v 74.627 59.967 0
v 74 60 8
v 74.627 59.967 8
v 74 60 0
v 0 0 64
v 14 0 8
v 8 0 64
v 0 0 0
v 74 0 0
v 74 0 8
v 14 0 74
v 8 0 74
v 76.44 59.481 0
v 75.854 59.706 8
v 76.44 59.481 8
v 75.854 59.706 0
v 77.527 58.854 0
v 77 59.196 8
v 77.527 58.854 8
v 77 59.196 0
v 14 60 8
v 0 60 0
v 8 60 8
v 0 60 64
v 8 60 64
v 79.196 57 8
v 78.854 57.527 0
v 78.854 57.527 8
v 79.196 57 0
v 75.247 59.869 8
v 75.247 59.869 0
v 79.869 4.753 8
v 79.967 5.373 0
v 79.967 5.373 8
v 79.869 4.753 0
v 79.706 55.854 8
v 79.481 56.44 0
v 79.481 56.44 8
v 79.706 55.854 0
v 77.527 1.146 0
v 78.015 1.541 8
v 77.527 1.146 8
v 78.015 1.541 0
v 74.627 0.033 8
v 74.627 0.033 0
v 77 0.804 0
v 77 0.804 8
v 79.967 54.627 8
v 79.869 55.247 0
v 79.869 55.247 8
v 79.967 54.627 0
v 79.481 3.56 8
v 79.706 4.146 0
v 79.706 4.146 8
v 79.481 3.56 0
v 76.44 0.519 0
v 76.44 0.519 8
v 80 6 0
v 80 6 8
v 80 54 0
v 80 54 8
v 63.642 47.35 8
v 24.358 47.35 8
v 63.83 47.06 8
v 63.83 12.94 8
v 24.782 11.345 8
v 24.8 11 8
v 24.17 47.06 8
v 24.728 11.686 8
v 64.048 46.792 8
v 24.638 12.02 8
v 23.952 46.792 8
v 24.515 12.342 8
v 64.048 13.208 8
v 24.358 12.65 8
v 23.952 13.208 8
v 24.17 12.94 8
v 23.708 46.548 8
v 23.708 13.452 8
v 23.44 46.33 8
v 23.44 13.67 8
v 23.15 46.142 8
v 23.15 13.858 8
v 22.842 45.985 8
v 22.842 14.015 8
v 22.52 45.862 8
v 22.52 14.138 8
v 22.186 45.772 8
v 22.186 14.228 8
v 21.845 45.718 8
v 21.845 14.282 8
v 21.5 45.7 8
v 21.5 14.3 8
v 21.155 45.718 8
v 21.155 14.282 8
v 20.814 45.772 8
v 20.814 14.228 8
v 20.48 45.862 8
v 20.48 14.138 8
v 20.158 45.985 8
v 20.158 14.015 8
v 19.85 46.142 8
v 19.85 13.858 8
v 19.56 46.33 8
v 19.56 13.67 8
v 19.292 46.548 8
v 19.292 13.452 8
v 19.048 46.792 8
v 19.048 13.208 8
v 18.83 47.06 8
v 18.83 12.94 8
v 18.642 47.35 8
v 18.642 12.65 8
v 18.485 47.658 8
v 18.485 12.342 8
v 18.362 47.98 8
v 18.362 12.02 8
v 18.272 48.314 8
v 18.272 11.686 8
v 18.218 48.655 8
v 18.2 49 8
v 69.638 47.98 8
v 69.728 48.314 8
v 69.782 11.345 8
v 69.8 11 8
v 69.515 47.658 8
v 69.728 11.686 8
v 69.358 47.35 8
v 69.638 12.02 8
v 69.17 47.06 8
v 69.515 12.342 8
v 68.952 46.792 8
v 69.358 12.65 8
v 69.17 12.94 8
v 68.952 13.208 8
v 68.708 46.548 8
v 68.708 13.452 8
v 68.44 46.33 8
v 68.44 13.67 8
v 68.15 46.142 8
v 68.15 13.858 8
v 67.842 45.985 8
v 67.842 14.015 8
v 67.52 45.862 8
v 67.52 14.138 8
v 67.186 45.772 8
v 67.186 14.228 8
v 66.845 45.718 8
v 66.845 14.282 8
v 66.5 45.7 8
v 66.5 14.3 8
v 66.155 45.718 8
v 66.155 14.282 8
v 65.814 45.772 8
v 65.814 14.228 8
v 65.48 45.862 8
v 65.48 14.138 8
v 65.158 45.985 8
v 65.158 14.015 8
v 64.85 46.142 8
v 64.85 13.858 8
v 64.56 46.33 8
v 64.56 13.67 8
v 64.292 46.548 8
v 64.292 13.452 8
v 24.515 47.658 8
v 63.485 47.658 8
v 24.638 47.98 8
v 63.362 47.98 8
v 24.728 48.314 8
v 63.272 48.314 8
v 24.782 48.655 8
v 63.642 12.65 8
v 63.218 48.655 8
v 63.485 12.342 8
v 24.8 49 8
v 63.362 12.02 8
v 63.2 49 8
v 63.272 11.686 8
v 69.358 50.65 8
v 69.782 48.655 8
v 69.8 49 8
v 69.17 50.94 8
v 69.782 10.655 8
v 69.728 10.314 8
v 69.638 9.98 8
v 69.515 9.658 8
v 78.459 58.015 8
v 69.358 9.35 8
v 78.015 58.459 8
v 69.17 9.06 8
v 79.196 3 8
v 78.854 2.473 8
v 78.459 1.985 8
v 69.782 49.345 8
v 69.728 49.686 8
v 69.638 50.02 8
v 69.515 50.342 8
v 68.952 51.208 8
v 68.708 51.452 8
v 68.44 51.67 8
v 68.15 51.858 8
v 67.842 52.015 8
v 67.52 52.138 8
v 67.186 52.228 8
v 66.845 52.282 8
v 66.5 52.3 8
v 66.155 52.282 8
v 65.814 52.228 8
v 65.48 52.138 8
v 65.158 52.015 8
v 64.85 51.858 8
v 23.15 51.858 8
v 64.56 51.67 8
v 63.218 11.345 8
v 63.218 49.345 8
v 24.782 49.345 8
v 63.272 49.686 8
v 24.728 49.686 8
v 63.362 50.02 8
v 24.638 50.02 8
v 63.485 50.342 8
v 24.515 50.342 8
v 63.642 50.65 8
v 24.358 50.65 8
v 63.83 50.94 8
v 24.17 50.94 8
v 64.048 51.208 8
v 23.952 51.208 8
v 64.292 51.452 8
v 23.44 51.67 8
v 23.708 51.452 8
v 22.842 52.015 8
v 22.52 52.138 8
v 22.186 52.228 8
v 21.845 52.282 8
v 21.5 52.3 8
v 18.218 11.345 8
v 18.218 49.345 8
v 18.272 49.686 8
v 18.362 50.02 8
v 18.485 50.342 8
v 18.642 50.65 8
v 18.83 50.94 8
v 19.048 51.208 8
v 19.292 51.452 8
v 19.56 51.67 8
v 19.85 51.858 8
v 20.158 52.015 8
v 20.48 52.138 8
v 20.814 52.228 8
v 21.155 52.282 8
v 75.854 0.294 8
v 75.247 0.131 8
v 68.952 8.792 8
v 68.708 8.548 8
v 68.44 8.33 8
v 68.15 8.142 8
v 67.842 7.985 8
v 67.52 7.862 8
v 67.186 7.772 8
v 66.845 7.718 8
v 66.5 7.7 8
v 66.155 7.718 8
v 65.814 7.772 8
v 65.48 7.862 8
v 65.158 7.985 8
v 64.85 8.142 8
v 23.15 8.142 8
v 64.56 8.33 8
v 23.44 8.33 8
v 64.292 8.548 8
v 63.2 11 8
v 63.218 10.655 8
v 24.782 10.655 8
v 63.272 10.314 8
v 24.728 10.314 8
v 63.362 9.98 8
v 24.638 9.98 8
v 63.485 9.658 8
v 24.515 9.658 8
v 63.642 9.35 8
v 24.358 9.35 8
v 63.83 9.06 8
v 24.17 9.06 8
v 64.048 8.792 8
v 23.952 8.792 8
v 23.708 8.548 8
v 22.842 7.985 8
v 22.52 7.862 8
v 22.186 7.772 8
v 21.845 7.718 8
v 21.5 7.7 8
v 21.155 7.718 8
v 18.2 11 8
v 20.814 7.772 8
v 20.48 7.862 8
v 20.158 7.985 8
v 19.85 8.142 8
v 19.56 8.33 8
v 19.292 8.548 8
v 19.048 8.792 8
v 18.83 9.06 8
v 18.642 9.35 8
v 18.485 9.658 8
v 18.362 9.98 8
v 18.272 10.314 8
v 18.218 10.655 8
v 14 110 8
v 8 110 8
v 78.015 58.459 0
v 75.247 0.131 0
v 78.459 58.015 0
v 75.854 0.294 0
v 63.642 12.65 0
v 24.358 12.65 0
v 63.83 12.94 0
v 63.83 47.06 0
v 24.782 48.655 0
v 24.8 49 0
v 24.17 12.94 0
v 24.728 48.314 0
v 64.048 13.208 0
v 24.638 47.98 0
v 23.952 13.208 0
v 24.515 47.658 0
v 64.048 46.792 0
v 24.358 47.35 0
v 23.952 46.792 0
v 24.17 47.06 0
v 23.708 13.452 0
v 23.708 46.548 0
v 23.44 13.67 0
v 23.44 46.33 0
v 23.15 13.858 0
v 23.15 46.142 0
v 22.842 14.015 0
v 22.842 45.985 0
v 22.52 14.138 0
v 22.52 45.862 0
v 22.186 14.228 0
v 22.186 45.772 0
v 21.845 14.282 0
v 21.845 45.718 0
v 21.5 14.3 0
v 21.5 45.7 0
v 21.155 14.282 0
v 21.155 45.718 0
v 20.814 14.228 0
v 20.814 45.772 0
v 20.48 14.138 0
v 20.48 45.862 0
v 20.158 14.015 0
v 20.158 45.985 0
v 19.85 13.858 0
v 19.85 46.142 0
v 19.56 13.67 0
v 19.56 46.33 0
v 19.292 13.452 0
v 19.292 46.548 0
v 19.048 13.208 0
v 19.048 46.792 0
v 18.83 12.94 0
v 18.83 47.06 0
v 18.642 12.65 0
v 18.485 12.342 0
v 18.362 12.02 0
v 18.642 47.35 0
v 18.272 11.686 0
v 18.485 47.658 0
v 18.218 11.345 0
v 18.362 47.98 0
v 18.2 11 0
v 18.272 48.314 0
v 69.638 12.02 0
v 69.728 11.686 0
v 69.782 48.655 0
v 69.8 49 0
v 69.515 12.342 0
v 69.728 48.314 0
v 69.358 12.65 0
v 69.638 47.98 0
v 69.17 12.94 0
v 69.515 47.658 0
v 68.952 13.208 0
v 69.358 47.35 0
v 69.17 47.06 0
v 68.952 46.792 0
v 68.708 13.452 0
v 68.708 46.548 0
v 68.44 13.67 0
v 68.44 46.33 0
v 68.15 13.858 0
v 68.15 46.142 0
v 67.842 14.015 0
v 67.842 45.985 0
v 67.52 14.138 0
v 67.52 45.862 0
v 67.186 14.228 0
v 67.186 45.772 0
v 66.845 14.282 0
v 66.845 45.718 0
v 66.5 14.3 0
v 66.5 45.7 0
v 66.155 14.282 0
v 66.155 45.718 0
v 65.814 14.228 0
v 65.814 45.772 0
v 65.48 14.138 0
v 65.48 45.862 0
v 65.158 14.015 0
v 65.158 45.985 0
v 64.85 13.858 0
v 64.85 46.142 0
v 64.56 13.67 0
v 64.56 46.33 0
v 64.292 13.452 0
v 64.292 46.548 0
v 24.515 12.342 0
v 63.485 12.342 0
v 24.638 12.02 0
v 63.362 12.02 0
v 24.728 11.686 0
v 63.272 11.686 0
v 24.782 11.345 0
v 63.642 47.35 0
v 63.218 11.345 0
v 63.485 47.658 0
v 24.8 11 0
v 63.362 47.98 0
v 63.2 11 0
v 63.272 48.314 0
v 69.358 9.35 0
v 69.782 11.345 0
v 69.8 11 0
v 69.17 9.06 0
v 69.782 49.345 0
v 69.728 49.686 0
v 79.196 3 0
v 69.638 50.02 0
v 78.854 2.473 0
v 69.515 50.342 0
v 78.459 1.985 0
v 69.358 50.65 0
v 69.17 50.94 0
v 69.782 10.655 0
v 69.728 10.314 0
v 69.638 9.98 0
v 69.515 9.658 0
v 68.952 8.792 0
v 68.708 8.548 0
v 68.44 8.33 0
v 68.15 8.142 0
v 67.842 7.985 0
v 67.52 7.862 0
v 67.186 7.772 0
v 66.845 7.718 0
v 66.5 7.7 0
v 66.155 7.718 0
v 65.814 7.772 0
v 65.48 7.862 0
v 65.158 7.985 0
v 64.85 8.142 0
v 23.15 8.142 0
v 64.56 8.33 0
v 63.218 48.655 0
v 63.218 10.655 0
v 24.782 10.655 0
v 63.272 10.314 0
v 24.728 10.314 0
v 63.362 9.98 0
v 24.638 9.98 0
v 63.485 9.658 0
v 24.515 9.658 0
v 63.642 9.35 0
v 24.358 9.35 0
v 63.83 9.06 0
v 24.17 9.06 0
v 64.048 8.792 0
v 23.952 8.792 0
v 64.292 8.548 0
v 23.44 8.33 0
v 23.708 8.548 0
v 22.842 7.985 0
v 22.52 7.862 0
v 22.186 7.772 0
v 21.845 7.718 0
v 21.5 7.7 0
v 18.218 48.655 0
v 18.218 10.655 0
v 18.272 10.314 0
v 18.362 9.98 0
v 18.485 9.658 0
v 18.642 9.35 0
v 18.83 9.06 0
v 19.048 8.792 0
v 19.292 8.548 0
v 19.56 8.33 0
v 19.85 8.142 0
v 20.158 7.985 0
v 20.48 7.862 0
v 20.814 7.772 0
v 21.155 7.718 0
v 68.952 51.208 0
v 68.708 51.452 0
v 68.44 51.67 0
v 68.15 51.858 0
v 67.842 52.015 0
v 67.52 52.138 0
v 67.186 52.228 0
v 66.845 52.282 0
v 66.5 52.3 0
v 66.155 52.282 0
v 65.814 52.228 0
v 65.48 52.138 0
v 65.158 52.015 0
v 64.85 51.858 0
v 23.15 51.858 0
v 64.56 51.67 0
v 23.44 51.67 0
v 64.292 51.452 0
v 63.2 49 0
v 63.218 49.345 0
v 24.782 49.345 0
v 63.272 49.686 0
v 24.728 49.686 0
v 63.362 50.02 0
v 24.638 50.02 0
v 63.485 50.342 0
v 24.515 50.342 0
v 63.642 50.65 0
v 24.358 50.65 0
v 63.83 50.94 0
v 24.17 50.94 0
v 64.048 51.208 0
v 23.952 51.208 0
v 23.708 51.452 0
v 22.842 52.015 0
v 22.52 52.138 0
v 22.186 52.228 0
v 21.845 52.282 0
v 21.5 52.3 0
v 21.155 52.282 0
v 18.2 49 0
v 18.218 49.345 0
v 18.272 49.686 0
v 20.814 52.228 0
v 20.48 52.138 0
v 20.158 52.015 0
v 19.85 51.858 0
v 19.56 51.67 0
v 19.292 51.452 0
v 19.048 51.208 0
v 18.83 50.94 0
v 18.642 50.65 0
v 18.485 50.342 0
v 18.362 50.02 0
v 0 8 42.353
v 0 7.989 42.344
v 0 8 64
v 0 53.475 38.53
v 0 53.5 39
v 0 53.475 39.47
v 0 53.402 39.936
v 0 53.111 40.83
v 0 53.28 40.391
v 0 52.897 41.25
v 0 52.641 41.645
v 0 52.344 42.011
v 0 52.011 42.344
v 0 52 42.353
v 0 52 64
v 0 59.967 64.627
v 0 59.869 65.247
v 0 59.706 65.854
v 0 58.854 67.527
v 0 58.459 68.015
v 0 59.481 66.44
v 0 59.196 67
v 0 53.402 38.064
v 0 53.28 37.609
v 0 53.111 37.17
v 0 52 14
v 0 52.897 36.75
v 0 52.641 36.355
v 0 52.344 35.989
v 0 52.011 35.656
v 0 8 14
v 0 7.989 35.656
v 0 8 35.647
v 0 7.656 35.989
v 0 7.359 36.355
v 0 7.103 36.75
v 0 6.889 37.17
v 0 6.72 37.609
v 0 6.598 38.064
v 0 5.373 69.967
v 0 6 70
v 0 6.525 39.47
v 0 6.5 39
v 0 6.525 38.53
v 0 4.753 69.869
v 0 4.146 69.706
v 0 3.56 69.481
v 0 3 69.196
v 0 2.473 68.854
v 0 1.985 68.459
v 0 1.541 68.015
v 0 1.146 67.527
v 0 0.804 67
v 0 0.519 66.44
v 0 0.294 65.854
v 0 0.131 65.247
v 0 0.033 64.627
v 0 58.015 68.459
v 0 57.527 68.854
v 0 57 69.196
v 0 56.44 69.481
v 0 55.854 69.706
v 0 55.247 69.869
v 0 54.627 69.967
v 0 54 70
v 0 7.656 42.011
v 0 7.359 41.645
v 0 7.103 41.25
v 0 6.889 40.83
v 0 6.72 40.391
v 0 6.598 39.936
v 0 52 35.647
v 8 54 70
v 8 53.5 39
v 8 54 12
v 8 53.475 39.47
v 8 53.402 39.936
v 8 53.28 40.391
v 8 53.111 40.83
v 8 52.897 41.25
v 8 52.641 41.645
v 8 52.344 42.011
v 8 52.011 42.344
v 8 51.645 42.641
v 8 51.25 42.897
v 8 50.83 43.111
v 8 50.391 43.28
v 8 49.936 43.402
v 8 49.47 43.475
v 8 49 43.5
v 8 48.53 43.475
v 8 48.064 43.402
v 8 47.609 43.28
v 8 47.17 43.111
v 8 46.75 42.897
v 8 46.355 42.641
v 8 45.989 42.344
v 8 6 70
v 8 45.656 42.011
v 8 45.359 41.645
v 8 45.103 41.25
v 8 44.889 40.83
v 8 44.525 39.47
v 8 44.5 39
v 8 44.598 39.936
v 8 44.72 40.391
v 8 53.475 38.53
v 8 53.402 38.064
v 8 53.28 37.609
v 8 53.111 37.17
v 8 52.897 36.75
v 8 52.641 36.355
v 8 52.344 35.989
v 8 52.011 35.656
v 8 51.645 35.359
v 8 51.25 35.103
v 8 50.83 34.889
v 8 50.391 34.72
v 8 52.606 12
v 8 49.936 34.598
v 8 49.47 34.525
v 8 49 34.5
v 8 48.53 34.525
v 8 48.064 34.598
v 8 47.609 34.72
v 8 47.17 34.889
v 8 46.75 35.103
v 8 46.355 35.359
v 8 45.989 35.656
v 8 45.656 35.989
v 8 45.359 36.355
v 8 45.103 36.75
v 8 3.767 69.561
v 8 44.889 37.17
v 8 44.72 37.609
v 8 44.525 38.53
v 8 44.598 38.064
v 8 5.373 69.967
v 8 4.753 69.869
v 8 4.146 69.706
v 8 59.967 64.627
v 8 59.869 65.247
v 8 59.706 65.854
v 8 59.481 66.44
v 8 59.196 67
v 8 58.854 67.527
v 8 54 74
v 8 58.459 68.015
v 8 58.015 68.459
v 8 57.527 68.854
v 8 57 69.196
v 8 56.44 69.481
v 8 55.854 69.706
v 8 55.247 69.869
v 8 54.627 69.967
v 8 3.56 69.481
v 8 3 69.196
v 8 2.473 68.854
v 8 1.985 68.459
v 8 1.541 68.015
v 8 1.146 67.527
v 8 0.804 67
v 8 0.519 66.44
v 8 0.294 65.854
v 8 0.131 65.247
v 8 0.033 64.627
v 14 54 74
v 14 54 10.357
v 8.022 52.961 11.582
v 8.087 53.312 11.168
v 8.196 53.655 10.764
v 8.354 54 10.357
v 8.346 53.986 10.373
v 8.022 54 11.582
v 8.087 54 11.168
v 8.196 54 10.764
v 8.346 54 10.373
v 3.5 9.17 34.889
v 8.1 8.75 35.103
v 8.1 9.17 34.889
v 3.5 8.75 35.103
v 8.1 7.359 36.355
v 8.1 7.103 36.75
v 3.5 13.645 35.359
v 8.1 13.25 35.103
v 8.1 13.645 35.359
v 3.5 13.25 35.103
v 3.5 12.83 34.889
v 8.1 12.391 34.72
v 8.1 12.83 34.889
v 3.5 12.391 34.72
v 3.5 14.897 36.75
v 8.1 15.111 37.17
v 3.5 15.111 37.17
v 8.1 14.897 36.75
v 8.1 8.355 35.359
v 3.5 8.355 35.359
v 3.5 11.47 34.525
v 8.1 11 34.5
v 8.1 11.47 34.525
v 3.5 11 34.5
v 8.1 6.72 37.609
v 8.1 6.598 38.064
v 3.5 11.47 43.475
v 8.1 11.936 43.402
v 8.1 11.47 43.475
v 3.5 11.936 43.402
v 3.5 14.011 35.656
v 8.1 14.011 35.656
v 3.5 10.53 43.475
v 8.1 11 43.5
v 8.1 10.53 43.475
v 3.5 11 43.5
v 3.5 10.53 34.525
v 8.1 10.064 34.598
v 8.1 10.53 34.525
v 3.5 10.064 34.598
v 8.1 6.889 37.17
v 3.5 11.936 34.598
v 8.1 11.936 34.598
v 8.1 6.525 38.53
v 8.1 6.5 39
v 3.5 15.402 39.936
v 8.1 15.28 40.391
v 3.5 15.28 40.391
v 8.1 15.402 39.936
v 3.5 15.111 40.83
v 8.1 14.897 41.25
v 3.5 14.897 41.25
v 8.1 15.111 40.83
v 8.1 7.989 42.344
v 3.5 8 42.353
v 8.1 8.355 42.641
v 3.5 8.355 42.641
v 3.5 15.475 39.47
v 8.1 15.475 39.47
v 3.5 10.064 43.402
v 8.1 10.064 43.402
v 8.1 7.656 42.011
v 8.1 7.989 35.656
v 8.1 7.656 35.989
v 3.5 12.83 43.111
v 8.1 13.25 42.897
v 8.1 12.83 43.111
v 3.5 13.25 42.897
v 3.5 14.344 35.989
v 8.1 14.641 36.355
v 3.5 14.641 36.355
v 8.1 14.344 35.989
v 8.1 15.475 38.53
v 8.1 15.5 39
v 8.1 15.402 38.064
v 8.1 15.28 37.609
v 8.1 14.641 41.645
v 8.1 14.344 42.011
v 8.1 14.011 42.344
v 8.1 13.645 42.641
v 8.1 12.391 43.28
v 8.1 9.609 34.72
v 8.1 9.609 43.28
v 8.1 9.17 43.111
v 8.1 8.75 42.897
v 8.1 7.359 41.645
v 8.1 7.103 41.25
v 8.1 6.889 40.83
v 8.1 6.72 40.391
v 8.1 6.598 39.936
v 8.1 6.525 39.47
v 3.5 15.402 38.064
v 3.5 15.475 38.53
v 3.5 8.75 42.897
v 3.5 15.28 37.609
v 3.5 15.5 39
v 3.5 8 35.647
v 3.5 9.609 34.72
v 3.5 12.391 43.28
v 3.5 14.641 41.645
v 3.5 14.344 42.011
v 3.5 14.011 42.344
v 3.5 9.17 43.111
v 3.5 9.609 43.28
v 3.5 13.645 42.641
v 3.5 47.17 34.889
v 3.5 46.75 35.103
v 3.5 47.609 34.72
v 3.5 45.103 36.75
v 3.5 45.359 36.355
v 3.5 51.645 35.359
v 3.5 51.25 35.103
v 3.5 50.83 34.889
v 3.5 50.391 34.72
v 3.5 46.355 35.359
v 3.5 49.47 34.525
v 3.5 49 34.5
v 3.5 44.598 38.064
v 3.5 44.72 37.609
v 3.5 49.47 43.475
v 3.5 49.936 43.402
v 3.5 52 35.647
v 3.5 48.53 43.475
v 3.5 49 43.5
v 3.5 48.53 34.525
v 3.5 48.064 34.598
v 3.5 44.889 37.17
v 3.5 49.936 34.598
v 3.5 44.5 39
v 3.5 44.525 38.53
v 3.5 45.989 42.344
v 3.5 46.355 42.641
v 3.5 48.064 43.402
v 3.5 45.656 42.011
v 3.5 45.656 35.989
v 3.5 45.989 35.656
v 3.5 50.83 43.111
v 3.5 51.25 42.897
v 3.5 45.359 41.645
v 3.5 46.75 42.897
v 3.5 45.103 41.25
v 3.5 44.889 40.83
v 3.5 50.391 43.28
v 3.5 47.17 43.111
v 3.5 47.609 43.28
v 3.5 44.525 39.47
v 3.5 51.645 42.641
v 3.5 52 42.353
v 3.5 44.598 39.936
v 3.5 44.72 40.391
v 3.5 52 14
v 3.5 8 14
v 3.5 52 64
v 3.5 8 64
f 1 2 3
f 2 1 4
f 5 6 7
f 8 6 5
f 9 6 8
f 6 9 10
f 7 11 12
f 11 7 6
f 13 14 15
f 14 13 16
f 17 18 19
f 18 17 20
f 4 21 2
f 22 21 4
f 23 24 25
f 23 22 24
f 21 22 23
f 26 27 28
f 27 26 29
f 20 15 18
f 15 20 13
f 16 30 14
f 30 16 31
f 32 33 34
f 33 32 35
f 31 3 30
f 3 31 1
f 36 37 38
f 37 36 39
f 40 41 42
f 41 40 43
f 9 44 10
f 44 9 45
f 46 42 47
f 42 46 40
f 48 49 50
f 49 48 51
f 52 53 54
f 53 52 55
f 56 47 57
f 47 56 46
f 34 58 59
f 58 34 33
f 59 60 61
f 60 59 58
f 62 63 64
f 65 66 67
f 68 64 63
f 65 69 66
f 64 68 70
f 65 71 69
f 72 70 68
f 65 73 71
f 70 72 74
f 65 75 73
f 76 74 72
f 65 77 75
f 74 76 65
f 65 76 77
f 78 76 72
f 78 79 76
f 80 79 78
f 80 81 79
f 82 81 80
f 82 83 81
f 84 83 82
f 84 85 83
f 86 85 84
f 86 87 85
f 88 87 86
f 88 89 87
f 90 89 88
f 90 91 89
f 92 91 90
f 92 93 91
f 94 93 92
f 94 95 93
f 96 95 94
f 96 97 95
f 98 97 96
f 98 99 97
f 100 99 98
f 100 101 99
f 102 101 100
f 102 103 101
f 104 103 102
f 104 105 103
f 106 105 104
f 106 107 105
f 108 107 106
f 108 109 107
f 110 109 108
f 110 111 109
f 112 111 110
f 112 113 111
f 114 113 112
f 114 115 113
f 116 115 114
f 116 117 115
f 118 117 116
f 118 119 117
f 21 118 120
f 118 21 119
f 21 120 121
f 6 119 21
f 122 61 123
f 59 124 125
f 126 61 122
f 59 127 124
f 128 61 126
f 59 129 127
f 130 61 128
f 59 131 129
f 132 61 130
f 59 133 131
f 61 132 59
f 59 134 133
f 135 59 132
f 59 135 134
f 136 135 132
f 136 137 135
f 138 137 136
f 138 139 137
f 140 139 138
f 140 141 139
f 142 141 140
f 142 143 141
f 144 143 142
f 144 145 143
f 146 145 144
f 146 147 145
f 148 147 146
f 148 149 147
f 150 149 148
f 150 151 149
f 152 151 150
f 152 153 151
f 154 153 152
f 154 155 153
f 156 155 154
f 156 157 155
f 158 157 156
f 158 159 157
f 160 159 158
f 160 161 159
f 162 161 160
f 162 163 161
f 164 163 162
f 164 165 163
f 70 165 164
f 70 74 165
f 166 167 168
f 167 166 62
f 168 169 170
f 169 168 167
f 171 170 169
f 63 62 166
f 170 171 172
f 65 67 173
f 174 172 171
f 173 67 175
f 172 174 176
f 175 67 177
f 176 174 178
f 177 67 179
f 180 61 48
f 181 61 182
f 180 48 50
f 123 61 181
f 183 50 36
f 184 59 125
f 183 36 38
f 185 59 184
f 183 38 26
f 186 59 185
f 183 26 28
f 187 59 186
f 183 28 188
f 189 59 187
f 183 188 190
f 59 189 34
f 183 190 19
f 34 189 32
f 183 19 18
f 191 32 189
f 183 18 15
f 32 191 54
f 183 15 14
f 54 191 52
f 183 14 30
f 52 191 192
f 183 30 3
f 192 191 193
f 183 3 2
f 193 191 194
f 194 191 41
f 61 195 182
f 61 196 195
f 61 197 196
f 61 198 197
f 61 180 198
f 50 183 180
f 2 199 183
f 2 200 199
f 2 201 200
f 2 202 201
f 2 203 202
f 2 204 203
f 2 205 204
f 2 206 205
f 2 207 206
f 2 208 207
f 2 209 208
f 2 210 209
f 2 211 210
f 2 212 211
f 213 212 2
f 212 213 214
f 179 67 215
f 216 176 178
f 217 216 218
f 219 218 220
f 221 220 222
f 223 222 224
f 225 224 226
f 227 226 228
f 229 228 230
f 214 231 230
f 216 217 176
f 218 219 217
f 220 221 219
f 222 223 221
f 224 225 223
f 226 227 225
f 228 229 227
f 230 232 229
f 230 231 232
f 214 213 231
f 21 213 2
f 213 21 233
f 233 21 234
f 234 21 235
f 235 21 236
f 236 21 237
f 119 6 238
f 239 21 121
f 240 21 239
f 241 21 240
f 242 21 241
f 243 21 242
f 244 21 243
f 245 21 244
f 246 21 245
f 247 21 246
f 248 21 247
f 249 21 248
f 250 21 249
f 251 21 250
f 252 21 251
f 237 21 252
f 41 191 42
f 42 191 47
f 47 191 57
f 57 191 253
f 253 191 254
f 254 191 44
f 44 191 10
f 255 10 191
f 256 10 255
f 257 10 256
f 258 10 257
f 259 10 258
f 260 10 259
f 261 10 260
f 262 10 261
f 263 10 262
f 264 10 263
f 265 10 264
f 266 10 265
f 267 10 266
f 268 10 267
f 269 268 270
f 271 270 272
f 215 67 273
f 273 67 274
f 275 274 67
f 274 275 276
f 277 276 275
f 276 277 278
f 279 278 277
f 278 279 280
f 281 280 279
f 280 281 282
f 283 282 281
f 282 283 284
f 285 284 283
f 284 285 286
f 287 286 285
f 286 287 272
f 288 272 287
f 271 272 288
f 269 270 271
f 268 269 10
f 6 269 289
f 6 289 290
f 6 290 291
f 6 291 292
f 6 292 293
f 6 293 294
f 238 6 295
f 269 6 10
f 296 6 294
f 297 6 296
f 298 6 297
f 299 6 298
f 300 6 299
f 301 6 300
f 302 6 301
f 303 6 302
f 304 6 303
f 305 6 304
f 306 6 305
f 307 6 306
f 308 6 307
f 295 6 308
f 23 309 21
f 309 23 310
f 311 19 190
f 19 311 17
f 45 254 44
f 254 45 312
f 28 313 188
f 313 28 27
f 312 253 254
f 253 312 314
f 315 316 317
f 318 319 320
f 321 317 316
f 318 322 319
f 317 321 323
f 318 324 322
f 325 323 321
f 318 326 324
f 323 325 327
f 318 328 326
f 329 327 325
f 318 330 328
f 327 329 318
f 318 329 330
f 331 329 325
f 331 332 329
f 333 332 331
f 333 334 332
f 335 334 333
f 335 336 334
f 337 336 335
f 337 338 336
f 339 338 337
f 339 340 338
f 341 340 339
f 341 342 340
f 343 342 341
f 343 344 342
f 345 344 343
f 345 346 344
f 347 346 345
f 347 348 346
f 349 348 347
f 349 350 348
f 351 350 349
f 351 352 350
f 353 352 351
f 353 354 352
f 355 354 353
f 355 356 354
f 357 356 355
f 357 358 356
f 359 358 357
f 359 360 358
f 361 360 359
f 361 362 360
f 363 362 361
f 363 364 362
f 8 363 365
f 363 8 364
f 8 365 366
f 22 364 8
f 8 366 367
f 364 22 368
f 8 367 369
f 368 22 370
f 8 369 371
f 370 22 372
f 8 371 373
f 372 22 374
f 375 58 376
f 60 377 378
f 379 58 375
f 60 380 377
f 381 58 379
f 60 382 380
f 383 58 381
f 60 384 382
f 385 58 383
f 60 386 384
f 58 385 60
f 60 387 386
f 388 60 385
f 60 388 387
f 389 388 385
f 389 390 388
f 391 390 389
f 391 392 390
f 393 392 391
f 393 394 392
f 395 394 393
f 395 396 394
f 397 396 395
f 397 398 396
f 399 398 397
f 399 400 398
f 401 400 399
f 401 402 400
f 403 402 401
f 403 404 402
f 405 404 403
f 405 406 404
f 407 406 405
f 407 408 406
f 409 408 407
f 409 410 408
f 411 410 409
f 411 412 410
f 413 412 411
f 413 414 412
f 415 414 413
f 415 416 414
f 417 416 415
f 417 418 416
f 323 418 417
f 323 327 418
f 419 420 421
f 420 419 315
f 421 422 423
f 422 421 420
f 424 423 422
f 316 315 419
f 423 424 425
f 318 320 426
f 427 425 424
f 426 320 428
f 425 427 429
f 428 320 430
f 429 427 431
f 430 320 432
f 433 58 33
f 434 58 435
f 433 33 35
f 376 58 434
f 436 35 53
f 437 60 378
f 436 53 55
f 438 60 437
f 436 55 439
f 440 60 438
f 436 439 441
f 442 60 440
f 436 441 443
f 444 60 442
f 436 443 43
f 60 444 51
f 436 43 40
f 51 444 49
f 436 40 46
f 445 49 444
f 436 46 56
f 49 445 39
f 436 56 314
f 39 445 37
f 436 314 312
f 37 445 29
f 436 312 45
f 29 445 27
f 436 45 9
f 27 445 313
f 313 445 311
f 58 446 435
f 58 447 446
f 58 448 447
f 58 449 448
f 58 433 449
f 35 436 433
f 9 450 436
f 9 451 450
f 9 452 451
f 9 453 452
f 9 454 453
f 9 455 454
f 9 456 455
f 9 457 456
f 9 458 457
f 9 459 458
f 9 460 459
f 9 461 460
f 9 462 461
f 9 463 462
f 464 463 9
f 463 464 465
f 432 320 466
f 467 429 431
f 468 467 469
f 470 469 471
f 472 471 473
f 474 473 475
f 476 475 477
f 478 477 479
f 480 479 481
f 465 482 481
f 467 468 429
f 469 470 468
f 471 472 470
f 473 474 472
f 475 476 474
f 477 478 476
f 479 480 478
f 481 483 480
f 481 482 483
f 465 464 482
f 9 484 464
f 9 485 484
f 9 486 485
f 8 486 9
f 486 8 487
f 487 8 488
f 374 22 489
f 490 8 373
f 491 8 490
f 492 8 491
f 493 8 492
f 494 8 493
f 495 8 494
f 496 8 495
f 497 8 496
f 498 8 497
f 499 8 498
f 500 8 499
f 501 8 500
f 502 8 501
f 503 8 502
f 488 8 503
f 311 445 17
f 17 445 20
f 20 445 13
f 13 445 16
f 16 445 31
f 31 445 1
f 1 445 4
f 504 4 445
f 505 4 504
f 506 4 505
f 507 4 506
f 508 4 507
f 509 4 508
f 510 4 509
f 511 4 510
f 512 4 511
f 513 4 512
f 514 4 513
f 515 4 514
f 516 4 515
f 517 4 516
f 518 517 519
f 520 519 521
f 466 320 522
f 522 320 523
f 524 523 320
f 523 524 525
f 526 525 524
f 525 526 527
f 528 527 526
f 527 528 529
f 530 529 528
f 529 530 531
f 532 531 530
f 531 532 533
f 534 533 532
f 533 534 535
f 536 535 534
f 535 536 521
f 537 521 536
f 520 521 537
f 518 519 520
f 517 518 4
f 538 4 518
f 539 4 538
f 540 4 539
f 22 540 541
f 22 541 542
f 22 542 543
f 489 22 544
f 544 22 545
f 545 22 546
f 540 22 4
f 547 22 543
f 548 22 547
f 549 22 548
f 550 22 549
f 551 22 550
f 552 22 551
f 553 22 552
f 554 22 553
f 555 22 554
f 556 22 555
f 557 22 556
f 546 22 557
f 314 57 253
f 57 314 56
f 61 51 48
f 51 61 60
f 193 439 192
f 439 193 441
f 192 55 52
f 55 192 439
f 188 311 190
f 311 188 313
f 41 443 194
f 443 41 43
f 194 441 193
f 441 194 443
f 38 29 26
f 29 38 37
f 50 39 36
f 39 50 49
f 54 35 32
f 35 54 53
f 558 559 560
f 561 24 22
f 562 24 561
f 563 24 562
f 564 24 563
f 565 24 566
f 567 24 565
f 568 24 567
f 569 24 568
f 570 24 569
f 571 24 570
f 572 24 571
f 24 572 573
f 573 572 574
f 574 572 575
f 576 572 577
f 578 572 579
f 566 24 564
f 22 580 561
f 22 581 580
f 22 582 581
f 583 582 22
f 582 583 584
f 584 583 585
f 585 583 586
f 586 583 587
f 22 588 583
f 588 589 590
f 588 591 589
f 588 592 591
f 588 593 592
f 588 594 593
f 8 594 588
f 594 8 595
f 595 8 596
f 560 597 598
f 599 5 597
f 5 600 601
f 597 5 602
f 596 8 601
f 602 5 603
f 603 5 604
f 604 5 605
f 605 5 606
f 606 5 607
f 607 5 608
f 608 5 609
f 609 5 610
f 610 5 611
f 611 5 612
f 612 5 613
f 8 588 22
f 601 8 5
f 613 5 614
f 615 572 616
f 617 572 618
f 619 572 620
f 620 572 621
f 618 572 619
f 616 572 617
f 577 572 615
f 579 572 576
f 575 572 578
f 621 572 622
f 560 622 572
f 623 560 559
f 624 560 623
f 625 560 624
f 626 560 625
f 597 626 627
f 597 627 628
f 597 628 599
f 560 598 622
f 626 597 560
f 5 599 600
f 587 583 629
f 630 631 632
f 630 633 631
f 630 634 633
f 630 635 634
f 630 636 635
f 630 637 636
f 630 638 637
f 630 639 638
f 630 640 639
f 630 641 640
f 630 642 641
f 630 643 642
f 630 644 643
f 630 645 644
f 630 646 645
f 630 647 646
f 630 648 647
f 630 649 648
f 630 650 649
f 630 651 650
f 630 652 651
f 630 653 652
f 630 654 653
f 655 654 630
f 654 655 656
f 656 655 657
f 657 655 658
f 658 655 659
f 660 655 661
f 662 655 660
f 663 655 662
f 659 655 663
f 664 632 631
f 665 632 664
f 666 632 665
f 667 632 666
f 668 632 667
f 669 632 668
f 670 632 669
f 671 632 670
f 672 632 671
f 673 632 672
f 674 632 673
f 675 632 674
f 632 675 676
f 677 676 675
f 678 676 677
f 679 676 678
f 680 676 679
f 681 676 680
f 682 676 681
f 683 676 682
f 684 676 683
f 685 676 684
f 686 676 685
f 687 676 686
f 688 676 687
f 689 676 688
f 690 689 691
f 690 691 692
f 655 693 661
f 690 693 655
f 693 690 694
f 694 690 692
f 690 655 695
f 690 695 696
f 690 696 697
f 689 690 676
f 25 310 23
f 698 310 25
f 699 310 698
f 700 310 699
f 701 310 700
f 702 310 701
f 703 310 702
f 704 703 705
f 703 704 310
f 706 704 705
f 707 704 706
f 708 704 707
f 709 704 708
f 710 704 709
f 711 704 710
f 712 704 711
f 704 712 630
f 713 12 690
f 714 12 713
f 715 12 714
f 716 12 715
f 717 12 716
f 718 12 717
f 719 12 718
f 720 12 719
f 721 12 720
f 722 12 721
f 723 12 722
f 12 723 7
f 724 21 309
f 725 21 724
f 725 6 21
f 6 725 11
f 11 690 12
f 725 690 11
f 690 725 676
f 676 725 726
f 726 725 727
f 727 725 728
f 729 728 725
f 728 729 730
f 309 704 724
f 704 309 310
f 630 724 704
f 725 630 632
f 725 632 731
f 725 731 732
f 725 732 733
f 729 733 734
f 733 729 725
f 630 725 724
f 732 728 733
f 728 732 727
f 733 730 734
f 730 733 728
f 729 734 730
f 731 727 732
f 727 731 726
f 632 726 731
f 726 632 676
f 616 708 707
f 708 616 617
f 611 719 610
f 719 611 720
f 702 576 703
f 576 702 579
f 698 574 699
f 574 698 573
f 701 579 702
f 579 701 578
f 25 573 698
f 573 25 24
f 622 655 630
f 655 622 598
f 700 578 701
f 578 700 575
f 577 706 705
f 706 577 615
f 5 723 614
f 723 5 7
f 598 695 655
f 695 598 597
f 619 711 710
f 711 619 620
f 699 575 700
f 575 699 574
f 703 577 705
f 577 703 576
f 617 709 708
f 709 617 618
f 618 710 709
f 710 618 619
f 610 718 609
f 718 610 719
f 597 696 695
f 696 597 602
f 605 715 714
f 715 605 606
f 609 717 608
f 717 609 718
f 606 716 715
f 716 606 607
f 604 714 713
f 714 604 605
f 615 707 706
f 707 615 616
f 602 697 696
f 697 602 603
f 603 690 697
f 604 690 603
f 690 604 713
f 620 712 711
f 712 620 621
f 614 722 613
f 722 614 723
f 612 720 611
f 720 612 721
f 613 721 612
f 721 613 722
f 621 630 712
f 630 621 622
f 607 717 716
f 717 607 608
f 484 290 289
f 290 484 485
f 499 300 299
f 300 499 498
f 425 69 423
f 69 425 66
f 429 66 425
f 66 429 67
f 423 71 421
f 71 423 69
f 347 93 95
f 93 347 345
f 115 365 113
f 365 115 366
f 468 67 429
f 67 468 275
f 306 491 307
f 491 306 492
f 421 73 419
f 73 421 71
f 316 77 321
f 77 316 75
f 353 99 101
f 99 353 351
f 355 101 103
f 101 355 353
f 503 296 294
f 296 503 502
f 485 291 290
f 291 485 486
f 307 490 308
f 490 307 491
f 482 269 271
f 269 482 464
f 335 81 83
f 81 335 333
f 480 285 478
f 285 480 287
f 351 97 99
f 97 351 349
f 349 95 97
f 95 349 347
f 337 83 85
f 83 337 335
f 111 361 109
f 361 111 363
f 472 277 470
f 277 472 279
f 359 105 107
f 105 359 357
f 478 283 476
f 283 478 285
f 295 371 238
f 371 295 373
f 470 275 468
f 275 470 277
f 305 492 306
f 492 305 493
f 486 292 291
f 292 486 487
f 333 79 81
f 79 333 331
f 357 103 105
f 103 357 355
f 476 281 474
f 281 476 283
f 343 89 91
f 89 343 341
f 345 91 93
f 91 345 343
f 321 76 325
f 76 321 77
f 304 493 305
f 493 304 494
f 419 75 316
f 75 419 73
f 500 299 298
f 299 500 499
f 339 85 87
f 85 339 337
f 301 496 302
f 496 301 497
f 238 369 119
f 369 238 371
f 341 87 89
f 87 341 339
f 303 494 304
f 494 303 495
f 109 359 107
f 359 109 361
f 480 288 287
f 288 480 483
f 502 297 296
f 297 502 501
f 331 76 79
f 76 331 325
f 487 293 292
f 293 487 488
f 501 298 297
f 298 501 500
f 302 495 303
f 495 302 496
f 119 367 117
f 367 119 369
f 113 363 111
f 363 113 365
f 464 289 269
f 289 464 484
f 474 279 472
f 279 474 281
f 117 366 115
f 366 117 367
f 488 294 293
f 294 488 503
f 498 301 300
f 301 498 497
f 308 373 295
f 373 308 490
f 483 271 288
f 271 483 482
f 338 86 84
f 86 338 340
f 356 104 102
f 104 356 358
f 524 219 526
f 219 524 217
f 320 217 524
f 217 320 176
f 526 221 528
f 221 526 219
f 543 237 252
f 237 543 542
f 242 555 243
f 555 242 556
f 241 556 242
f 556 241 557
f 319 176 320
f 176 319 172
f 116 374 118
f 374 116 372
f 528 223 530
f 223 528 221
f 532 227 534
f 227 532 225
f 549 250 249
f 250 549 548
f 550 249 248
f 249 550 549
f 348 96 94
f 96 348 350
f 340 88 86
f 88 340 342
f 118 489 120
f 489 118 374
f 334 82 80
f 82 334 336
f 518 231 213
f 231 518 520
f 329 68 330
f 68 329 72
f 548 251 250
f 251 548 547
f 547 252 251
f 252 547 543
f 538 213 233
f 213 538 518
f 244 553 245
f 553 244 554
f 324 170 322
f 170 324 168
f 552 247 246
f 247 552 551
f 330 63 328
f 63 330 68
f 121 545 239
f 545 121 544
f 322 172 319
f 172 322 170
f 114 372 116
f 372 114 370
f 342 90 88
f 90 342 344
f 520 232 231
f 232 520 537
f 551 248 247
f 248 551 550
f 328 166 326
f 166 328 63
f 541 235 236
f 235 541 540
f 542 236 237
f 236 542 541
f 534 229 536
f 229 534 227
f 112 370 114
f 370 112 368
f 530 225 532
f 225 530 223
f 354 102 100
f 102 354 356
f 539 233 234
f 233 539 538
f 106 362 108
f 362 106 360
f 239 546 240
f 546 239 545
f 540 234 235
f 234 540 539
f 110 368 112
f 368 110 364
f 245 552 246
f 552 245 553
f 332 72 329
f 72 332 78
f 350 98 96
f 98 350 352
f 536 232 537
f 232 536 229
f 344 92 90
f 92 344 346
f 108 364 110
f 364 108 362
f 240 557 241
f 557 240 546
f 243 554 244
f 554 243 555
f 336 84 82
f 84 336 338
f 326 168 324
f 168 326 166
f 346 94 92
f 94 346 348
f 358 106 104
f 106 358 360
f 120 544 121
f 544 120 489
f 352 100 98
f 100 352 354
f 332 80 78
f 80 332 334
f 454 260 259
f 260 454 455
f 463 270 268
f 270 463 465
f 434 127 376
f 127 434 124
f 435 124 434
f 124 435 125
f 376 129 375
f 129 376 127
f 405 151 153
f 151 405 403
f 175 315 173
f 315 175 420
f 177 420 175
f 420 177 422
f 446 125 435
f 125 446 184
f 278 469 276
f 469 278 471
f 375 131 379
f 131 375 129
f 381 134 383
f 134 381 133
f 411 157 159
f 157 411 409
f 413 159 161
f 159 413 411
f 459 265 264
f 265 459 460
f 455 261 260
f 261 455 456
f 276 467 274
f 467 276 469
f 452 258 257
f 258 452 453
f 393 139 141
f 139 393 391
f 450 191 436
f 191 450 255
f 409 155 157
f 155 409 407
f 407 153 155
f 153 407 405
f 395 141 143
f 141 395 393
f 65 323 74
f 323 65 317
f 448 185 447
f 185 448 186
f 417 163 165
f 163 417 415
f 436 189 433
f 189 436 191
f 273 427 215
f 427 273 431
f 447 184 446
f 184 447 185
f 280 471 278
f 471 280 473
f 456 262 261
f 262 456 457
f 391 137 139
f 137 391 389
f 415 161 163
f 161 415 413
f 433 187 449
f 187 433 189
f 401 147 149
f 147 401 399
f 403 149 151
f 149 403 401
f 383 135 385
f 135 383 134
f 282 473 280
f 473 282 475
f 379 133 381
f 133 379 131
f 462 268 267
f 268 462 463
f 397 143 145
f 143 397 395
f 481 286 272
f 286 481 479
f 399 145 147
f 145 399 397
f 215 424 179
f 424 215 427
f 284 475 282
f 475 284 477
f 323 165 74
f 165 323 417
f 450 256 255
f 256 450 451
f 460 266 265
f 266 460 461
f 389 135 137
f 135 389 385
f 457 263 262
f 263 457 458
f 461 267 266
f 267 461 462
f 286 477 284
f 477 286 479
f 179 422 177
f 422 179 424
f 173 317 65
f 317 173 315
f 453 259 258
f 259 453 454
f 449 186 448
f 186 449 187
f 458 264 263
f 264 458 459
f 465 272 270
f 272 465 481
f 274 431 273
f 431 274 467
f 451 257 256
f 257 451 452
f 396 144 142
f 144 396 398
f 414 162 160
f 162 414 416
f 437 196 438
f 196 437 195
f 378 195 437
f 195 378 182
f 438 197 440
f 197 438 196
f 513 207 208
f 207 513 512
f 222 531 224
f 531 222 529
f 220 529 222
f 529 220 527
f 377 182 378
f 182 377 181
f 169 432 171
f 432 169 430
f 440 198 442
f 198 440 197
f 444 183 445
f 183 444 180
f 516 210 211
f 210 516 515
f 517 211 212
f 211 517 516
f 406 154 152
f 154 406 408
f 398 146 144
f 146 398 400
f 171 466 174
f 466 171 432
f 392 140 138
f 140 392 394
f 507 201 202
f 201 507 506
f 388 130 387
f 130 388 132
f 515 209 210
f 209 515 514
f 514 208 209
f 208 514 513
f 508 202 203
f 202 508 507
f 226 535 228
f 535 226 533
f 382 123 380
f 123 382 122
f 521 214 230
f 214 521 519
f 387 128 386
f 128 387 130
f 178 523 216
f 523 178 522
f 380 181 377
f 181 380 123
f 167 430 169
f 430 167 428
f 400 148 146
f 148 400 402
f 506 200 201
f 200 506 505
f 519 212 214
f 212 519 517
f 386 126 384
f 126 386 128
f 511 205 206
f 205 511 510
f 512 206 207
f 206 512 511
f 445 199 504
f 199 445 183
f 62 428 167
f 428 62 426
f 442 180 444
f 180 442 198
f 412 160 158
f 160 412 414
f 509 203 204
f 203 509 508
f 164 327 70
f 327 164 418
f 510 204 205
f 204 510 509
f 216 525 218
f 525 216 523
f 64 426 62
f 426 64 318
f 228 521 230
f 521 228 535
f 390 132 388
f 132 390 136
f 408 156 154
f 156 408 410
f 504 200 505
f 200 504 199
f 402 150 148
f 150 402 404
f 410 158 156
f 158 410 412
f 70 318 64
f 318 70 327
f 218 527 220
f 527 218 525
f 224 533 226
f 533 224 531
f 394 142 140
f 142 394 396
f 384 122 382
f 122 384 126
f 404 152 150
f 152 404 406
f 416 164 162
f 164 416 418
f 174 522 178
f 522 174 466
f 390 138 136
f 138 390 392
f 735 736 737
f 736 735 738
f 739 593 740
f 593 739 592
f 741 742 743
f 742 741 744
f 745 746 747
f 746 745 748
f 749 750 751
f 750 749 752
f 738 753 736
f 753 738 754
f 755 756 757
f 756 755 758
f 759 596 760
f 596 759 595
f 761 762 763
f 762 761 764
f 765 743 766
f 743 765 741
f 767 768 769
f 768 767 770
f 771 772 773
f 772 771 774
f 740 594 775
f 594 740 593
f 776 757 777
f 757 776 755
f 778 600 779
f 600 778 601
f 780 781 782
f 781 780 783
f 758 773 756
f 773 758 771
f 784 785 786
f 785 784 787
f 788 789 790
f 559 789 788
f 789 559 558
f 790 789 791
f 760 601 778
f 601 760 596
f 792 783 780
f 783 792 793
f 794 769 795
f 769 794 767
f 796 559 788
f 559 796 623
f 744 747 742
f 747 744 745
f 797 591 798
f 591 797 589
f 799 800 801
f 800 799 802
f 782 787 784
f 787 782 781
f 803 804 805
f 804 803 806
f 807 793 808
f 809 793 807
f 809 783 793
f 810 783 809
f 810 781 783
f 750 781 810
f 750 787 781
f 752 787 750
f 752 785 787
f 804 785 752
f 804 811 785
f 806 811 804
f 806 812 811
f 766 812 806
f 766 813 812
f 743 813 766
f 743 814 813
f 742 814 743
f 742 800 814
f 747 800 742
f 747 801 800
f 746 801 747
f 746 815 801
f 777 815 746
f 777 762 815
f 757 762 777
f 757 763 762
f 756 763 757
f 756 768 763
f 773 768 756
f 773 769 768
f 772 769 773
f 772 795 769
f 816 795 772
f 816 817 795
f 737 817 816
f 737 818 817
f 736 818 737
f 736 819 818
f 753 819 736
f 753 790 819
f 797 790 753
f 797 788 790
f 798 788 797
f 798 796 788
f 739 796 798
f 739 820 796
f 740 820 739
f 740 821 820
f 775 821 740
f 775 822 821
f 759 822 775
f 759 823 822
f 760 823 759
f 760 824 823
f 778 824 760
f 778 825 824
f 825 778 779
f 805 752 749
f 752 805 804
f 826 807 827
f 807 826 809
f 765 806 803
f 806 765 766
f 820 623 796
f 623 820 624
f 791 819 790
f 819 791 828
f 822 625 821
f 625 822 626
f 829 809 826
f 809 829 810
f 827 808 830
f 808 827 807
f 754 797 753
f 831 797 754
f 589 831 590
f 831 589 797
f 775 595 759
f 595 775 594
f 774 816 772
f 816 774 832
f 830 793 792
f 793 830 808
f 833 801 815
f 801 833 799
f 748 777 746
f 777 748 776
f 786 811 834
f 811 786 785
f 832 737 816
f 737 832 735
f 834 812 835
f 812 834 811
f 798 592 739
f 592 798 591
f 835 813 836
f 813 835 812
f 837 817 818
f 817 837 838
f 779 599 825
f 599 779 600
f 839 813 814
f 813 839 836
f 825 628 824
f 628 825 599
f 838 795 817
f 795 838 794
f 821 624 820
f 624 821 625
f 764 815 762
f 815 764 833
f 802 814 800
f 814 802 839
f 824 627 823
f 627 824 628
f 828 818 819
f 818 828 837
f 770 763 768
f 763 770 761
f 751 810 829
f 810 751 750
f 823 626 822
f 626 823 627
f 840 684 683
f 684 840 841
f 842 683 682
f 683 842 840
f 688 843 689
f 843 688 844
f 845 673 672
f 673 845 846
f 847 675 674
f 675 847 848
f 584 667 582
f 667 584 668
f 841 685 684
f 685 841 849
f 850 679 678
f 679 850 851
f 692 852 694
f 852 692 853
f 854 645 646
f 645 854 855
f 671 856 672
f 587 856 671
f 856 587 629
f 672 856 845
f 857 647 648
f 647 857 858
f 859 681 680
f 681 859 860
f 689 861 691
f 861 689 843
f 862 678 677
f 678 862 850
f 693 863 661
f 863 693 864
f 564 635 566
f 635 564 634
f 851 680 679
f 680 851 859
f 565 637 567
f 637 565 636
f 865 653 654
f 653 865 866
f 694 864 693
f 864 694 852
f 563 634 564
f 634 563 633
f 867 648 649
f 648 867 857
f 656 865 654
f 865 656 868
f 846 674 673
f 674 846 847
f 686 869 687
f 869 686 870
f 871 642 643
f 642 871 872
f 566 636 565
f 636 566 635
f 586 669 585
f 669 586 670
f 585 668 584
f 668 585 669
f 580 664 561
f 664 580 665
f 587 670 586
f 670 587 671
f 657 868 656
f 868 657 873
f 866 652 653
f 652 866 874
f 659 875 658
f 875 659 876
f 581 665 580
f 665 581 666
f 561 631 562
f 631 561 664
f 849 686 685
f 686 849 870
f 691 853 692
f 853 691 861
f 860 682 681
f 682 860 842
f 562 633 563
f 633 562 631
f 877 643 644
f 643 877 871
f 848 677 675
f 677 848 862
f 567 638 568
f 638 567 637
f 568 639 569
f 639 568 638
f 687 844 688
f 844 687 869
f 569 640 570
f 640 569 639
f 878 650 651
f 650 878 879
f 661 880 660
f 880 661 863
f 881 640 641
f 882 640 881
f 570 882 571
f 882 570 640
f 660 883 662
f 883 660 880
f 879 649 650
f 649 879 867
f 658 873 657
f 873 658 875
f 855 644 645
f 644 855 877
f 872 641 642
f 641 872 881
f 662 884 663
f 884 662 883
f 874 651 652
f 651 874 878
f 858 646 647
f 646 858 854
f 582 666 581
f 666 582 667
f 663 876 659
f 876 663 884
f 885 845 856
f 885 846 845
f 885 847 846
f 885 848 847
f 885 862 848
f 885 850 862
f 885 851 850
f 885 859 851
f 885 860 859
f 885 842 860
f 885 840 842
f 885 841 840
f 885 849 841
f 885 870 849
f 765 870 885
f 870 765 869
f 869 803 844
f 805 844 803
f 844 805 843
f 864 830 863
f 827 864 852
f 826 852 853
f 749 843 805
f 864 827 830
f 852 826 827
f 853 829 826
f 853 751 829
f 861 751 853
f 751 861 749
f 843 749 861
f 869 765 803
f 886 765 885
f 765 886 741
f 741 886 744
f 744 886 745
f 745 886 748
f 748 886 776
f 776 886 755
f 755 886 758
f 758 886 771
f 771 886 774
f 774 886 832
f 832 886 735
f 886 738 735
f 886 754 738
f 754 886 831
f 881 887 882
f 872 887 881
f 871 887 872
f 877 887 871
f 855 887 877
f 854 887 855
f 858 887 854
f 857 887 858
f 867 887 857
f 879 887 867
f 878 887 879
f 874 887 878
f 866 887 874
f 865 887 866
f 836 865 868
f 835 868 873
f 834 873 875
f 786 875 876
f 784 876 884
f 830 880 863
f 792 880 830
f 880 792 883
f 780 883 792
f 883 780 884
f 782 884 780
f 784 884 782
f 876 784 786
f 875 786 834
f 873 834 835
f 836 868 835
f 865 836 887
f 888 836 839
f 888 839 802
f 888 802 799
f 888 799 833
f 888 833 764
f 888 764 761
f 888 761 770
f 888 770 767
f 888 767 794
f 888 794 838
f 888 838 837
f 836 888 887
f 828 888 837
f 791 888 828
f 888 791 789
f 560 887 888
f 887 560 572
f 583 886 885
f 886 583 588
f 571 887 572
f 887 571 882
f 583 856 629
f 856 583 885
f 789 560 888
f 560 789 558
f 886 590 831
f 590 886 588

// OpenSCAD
// =============================================================================
// CellForge Manufacturing Lab: Parametric Industrial Mounting Bracket
// Component: Heavy-Duty Structural L-Bracket with Reinforcing Gusset & Pockets
// Units: Millimeters (mm)
// Target Manufacturing Routes:
//   Route A: CNC Machining from 6061-T6 Aluminum Billet
//   Route B: Metal Additive Manufacturing (LPBF / AlSi10Mg) with CNC Finishing
// =============================================================================

/* [Principal Dimensions (mm)] */
bracket_width = 60.0;       // Total bracket width across Y-axis
base_length = 80.0;         // Length of base mounting foot along X-axis
flange_height = 70.0;       // Height of vertical mounting flange along Z-axis
wall_thickness = 8.0;       // Nominal wall thickness of base and vertical flange
gusset_thickness = 6.0;     // Thickness of triangular structural stiffening ribs

/* [Fastener Mounting Holes (mm)] */
// ISO 273 Medium Fit Clearance Holes
base_hole_dia = 6.6;        // M6 clearance hole diameter (base plate)
flange_hole_dia = 9.0;      // M8 clearance hole diameter (vertical flange)
base_hole_pitch_x = 45.0;   // Spacing between base hole centers along X
base_hole_pitch_y = 38.0;   // Spacing between base hole centers along Y
flange_hole_pitch_z = 35.0; // Spacing between flange hole centers along Z
flange_hole_pitch_y = 38.0; // Spacing between flange hole centers along Y

/* [Design for Manufacturing Features] */
corner_fillet_radius = 6.0; // Outer corner blend radius (reduces stress concentration)
inner_fillet_radius = 4.0;  // Fillet radius at intersection of base and flange
enable_pockets = true;      // Enable weight-reduction pockets (Additive / 3D milling feature)
pocket_depth = 3.5;         // Depth of recessed pockets (mm)

/* [Rendering Quality] */
$fn = 60;                   // Circle facet resolution for smooth arcs and bores

// Small epsilon to guarantee clean boolean manifold cuts without coincident faces
eps = 0.1;

// =============================================================================
// Main Assembly Construction
// =============================================================================

module mounting_bracket() {
    difference() {
        // Positive Material Volume
        union() {
            // 1. Horizontal Base Plate
            base_plate();

            // 2. Vertical Mounting Flange
            vertical_flange();

            // 3. Structural Gusset Ribs (Reinforcing gussets at Y edges)
            gusset_ribs();

            // 4. Structural Internal Fillet
            inner_bend_fillet();
        }

        // Subtractive Volume: Mounting Bores & Lightening Pockets
        // 1. Base Plate Fastener Holes (4x M6 clearance)
        base_mounting_holes();

        // 2. Vertical Flange Fastener Holes (2x M8 clearance)
        flange_mounting_holes();

        // 3. Weight-Reduction Lightening Pockets
        if (enable_pockets) {
            lightening_pockets();
        }
    }
}

// =============================================================================
// Positive Geometry Modules
// =============================================================================

module base_plate() {
    // Filleted base plate
    hull() {
        // Inner edge near vertical wall
        translate([wall_thickness, 0, 0])
            cube([eps, bracket_width, wall_thickness]);

        // Outer corner fillets
        translate([base_length - corner_fillet_radius, corner_fillet_radius, 0])
            cylinder(r=corner_fillet_radius, h=wall_thickness);

        translate([base_length - corner_fillet_radius, bracket_width - corner_fillet_radius, 0])
            cylinder(r=corner_fillet_radius, h=wall_thickness);
    }
    // Solid junction zone
    cube([wall_thickness, bracket_width, wall_thickness]);
}

module vertical_flange() {
    // Filleted vertical flange
    hull() {
        // Bottom junction zone
        cube([wall_thickness, bracket_width, eps]);

        // Top corner fillets
        translate([0, corner_fillet_radius, flange_height - corner_fillet_radius])
            rotate([0, 90, 0])
            cylinder(r=corner_fillet_radius, h=wall_thickness);

        translate([0, bracket_width - corner_fillet_radius, flange_height - corner_fillet_radius])
            rotate([0, 90, 0])
            cylinder(r=corner_fillet_radius, h=wall_thickness);
    }
}

module gusset_ribs() {
    // Left Structural Gusset
    translate([wall_thickness, 0, wall_thickness])
        single_gusset();

    // Right Structural Gusset
    translate([wall_thickness, bracket_width - gusset_thickness, wall_thickness])
        single_gusset();
}

module single_gusset() {
    // Triangular gusset web
    gusset_x = base_length - wall_thickness - corner_fillet_radius;
    gusset_z = flange_height - wall_thickness - corner_fillet_radius;

    rotate([90, 0, 90])
        linear_extrude(height=gusset_thickness)
        polygon(points=[
            [0, 0],
            [gusset_z, 0],
            [0, gusset_x]
        ]);
}

module inner_bend_fillet() {
    // Reinforcing cylinder at the 90-degree internal corner
    translate([wall_thickness + inner_fillet_radius, 0, wall_thickness + inner_fillet_radius])
        difference() {
            translate([-inner_fillet_radius, 0, -inner_fillet_radius])
                cube([inner_fillet_radius, bracket_width, inner_fillet_radius]);

            rotate([-90, 0, 0])
                cylinder(r=inner_fillet_radius, h=bracket_width);
        }
}

// =============================================================================
// Subtractive Geometry Modules (Through Holes & Cuts)
// =============================================================================

module base_mounting_holes() {
    // 4x clearance holes in base plate (M6)
    center_y = bracket_width / 2.0;
    y1 = center_y - (base_hole_pitch_y / 2.0);
    y2 = center_y + (base_hole_pitch_y / 2.0);

    x_start = wall_thickness + (base_length - wall_thickness - base_hole_pitch_x) / 2.0;
    x1 = x_start;
    x2 = x_start + base_hole_pitch_x;

    for (x = [x1, x2]) {
        for (y = [y1, y2]) {
            translate([x, y, -eps])
                cylinder(d=base_hole_dia, h=wall_thickness + 2 * eps);
        }
    }
}

module flange_mounting_holes() {
    // 2x clearance holes in vertical flange (M8)
    center_y = bracket_width / 2.0;
    y1 = center_y - (flange_hole_pitch_y / 2.0);
    y2 = center_y + (flange_hole_pitch_y / 2.0);

    z_pos = wall_thickness + (flange_height - wall_thickness) / 2.0;

    for (y = [y1, y2]) {
        translate([-eps, y, z_pos])
            rotate([0, 90, 0])
            cylinder(d=flange_hole_dia, h=wall_thickness + 2 * eps);
    }
}

module lightening_pockets() {
    // Recessed pocket on back face of vertical flange (weight reduction / DfAM feature)
    pocket_w = bracket_width - (2 * corner_fillet_radius) - 4.0;
    pocket_h = flange_height - wall_thickness - (2 * corner_fillet_radius);

    if (pocket_w > 10 && pocket_h > 10) {
        translate([-eps, (bracket_width - pocket_w) / 2.0, wall_thickness + corner_fillet_radius])
            cube([pocket_depth + eps, pocket_w, pocket_h]);
    }
}

// Instantiate the component
mounting_bracket();
